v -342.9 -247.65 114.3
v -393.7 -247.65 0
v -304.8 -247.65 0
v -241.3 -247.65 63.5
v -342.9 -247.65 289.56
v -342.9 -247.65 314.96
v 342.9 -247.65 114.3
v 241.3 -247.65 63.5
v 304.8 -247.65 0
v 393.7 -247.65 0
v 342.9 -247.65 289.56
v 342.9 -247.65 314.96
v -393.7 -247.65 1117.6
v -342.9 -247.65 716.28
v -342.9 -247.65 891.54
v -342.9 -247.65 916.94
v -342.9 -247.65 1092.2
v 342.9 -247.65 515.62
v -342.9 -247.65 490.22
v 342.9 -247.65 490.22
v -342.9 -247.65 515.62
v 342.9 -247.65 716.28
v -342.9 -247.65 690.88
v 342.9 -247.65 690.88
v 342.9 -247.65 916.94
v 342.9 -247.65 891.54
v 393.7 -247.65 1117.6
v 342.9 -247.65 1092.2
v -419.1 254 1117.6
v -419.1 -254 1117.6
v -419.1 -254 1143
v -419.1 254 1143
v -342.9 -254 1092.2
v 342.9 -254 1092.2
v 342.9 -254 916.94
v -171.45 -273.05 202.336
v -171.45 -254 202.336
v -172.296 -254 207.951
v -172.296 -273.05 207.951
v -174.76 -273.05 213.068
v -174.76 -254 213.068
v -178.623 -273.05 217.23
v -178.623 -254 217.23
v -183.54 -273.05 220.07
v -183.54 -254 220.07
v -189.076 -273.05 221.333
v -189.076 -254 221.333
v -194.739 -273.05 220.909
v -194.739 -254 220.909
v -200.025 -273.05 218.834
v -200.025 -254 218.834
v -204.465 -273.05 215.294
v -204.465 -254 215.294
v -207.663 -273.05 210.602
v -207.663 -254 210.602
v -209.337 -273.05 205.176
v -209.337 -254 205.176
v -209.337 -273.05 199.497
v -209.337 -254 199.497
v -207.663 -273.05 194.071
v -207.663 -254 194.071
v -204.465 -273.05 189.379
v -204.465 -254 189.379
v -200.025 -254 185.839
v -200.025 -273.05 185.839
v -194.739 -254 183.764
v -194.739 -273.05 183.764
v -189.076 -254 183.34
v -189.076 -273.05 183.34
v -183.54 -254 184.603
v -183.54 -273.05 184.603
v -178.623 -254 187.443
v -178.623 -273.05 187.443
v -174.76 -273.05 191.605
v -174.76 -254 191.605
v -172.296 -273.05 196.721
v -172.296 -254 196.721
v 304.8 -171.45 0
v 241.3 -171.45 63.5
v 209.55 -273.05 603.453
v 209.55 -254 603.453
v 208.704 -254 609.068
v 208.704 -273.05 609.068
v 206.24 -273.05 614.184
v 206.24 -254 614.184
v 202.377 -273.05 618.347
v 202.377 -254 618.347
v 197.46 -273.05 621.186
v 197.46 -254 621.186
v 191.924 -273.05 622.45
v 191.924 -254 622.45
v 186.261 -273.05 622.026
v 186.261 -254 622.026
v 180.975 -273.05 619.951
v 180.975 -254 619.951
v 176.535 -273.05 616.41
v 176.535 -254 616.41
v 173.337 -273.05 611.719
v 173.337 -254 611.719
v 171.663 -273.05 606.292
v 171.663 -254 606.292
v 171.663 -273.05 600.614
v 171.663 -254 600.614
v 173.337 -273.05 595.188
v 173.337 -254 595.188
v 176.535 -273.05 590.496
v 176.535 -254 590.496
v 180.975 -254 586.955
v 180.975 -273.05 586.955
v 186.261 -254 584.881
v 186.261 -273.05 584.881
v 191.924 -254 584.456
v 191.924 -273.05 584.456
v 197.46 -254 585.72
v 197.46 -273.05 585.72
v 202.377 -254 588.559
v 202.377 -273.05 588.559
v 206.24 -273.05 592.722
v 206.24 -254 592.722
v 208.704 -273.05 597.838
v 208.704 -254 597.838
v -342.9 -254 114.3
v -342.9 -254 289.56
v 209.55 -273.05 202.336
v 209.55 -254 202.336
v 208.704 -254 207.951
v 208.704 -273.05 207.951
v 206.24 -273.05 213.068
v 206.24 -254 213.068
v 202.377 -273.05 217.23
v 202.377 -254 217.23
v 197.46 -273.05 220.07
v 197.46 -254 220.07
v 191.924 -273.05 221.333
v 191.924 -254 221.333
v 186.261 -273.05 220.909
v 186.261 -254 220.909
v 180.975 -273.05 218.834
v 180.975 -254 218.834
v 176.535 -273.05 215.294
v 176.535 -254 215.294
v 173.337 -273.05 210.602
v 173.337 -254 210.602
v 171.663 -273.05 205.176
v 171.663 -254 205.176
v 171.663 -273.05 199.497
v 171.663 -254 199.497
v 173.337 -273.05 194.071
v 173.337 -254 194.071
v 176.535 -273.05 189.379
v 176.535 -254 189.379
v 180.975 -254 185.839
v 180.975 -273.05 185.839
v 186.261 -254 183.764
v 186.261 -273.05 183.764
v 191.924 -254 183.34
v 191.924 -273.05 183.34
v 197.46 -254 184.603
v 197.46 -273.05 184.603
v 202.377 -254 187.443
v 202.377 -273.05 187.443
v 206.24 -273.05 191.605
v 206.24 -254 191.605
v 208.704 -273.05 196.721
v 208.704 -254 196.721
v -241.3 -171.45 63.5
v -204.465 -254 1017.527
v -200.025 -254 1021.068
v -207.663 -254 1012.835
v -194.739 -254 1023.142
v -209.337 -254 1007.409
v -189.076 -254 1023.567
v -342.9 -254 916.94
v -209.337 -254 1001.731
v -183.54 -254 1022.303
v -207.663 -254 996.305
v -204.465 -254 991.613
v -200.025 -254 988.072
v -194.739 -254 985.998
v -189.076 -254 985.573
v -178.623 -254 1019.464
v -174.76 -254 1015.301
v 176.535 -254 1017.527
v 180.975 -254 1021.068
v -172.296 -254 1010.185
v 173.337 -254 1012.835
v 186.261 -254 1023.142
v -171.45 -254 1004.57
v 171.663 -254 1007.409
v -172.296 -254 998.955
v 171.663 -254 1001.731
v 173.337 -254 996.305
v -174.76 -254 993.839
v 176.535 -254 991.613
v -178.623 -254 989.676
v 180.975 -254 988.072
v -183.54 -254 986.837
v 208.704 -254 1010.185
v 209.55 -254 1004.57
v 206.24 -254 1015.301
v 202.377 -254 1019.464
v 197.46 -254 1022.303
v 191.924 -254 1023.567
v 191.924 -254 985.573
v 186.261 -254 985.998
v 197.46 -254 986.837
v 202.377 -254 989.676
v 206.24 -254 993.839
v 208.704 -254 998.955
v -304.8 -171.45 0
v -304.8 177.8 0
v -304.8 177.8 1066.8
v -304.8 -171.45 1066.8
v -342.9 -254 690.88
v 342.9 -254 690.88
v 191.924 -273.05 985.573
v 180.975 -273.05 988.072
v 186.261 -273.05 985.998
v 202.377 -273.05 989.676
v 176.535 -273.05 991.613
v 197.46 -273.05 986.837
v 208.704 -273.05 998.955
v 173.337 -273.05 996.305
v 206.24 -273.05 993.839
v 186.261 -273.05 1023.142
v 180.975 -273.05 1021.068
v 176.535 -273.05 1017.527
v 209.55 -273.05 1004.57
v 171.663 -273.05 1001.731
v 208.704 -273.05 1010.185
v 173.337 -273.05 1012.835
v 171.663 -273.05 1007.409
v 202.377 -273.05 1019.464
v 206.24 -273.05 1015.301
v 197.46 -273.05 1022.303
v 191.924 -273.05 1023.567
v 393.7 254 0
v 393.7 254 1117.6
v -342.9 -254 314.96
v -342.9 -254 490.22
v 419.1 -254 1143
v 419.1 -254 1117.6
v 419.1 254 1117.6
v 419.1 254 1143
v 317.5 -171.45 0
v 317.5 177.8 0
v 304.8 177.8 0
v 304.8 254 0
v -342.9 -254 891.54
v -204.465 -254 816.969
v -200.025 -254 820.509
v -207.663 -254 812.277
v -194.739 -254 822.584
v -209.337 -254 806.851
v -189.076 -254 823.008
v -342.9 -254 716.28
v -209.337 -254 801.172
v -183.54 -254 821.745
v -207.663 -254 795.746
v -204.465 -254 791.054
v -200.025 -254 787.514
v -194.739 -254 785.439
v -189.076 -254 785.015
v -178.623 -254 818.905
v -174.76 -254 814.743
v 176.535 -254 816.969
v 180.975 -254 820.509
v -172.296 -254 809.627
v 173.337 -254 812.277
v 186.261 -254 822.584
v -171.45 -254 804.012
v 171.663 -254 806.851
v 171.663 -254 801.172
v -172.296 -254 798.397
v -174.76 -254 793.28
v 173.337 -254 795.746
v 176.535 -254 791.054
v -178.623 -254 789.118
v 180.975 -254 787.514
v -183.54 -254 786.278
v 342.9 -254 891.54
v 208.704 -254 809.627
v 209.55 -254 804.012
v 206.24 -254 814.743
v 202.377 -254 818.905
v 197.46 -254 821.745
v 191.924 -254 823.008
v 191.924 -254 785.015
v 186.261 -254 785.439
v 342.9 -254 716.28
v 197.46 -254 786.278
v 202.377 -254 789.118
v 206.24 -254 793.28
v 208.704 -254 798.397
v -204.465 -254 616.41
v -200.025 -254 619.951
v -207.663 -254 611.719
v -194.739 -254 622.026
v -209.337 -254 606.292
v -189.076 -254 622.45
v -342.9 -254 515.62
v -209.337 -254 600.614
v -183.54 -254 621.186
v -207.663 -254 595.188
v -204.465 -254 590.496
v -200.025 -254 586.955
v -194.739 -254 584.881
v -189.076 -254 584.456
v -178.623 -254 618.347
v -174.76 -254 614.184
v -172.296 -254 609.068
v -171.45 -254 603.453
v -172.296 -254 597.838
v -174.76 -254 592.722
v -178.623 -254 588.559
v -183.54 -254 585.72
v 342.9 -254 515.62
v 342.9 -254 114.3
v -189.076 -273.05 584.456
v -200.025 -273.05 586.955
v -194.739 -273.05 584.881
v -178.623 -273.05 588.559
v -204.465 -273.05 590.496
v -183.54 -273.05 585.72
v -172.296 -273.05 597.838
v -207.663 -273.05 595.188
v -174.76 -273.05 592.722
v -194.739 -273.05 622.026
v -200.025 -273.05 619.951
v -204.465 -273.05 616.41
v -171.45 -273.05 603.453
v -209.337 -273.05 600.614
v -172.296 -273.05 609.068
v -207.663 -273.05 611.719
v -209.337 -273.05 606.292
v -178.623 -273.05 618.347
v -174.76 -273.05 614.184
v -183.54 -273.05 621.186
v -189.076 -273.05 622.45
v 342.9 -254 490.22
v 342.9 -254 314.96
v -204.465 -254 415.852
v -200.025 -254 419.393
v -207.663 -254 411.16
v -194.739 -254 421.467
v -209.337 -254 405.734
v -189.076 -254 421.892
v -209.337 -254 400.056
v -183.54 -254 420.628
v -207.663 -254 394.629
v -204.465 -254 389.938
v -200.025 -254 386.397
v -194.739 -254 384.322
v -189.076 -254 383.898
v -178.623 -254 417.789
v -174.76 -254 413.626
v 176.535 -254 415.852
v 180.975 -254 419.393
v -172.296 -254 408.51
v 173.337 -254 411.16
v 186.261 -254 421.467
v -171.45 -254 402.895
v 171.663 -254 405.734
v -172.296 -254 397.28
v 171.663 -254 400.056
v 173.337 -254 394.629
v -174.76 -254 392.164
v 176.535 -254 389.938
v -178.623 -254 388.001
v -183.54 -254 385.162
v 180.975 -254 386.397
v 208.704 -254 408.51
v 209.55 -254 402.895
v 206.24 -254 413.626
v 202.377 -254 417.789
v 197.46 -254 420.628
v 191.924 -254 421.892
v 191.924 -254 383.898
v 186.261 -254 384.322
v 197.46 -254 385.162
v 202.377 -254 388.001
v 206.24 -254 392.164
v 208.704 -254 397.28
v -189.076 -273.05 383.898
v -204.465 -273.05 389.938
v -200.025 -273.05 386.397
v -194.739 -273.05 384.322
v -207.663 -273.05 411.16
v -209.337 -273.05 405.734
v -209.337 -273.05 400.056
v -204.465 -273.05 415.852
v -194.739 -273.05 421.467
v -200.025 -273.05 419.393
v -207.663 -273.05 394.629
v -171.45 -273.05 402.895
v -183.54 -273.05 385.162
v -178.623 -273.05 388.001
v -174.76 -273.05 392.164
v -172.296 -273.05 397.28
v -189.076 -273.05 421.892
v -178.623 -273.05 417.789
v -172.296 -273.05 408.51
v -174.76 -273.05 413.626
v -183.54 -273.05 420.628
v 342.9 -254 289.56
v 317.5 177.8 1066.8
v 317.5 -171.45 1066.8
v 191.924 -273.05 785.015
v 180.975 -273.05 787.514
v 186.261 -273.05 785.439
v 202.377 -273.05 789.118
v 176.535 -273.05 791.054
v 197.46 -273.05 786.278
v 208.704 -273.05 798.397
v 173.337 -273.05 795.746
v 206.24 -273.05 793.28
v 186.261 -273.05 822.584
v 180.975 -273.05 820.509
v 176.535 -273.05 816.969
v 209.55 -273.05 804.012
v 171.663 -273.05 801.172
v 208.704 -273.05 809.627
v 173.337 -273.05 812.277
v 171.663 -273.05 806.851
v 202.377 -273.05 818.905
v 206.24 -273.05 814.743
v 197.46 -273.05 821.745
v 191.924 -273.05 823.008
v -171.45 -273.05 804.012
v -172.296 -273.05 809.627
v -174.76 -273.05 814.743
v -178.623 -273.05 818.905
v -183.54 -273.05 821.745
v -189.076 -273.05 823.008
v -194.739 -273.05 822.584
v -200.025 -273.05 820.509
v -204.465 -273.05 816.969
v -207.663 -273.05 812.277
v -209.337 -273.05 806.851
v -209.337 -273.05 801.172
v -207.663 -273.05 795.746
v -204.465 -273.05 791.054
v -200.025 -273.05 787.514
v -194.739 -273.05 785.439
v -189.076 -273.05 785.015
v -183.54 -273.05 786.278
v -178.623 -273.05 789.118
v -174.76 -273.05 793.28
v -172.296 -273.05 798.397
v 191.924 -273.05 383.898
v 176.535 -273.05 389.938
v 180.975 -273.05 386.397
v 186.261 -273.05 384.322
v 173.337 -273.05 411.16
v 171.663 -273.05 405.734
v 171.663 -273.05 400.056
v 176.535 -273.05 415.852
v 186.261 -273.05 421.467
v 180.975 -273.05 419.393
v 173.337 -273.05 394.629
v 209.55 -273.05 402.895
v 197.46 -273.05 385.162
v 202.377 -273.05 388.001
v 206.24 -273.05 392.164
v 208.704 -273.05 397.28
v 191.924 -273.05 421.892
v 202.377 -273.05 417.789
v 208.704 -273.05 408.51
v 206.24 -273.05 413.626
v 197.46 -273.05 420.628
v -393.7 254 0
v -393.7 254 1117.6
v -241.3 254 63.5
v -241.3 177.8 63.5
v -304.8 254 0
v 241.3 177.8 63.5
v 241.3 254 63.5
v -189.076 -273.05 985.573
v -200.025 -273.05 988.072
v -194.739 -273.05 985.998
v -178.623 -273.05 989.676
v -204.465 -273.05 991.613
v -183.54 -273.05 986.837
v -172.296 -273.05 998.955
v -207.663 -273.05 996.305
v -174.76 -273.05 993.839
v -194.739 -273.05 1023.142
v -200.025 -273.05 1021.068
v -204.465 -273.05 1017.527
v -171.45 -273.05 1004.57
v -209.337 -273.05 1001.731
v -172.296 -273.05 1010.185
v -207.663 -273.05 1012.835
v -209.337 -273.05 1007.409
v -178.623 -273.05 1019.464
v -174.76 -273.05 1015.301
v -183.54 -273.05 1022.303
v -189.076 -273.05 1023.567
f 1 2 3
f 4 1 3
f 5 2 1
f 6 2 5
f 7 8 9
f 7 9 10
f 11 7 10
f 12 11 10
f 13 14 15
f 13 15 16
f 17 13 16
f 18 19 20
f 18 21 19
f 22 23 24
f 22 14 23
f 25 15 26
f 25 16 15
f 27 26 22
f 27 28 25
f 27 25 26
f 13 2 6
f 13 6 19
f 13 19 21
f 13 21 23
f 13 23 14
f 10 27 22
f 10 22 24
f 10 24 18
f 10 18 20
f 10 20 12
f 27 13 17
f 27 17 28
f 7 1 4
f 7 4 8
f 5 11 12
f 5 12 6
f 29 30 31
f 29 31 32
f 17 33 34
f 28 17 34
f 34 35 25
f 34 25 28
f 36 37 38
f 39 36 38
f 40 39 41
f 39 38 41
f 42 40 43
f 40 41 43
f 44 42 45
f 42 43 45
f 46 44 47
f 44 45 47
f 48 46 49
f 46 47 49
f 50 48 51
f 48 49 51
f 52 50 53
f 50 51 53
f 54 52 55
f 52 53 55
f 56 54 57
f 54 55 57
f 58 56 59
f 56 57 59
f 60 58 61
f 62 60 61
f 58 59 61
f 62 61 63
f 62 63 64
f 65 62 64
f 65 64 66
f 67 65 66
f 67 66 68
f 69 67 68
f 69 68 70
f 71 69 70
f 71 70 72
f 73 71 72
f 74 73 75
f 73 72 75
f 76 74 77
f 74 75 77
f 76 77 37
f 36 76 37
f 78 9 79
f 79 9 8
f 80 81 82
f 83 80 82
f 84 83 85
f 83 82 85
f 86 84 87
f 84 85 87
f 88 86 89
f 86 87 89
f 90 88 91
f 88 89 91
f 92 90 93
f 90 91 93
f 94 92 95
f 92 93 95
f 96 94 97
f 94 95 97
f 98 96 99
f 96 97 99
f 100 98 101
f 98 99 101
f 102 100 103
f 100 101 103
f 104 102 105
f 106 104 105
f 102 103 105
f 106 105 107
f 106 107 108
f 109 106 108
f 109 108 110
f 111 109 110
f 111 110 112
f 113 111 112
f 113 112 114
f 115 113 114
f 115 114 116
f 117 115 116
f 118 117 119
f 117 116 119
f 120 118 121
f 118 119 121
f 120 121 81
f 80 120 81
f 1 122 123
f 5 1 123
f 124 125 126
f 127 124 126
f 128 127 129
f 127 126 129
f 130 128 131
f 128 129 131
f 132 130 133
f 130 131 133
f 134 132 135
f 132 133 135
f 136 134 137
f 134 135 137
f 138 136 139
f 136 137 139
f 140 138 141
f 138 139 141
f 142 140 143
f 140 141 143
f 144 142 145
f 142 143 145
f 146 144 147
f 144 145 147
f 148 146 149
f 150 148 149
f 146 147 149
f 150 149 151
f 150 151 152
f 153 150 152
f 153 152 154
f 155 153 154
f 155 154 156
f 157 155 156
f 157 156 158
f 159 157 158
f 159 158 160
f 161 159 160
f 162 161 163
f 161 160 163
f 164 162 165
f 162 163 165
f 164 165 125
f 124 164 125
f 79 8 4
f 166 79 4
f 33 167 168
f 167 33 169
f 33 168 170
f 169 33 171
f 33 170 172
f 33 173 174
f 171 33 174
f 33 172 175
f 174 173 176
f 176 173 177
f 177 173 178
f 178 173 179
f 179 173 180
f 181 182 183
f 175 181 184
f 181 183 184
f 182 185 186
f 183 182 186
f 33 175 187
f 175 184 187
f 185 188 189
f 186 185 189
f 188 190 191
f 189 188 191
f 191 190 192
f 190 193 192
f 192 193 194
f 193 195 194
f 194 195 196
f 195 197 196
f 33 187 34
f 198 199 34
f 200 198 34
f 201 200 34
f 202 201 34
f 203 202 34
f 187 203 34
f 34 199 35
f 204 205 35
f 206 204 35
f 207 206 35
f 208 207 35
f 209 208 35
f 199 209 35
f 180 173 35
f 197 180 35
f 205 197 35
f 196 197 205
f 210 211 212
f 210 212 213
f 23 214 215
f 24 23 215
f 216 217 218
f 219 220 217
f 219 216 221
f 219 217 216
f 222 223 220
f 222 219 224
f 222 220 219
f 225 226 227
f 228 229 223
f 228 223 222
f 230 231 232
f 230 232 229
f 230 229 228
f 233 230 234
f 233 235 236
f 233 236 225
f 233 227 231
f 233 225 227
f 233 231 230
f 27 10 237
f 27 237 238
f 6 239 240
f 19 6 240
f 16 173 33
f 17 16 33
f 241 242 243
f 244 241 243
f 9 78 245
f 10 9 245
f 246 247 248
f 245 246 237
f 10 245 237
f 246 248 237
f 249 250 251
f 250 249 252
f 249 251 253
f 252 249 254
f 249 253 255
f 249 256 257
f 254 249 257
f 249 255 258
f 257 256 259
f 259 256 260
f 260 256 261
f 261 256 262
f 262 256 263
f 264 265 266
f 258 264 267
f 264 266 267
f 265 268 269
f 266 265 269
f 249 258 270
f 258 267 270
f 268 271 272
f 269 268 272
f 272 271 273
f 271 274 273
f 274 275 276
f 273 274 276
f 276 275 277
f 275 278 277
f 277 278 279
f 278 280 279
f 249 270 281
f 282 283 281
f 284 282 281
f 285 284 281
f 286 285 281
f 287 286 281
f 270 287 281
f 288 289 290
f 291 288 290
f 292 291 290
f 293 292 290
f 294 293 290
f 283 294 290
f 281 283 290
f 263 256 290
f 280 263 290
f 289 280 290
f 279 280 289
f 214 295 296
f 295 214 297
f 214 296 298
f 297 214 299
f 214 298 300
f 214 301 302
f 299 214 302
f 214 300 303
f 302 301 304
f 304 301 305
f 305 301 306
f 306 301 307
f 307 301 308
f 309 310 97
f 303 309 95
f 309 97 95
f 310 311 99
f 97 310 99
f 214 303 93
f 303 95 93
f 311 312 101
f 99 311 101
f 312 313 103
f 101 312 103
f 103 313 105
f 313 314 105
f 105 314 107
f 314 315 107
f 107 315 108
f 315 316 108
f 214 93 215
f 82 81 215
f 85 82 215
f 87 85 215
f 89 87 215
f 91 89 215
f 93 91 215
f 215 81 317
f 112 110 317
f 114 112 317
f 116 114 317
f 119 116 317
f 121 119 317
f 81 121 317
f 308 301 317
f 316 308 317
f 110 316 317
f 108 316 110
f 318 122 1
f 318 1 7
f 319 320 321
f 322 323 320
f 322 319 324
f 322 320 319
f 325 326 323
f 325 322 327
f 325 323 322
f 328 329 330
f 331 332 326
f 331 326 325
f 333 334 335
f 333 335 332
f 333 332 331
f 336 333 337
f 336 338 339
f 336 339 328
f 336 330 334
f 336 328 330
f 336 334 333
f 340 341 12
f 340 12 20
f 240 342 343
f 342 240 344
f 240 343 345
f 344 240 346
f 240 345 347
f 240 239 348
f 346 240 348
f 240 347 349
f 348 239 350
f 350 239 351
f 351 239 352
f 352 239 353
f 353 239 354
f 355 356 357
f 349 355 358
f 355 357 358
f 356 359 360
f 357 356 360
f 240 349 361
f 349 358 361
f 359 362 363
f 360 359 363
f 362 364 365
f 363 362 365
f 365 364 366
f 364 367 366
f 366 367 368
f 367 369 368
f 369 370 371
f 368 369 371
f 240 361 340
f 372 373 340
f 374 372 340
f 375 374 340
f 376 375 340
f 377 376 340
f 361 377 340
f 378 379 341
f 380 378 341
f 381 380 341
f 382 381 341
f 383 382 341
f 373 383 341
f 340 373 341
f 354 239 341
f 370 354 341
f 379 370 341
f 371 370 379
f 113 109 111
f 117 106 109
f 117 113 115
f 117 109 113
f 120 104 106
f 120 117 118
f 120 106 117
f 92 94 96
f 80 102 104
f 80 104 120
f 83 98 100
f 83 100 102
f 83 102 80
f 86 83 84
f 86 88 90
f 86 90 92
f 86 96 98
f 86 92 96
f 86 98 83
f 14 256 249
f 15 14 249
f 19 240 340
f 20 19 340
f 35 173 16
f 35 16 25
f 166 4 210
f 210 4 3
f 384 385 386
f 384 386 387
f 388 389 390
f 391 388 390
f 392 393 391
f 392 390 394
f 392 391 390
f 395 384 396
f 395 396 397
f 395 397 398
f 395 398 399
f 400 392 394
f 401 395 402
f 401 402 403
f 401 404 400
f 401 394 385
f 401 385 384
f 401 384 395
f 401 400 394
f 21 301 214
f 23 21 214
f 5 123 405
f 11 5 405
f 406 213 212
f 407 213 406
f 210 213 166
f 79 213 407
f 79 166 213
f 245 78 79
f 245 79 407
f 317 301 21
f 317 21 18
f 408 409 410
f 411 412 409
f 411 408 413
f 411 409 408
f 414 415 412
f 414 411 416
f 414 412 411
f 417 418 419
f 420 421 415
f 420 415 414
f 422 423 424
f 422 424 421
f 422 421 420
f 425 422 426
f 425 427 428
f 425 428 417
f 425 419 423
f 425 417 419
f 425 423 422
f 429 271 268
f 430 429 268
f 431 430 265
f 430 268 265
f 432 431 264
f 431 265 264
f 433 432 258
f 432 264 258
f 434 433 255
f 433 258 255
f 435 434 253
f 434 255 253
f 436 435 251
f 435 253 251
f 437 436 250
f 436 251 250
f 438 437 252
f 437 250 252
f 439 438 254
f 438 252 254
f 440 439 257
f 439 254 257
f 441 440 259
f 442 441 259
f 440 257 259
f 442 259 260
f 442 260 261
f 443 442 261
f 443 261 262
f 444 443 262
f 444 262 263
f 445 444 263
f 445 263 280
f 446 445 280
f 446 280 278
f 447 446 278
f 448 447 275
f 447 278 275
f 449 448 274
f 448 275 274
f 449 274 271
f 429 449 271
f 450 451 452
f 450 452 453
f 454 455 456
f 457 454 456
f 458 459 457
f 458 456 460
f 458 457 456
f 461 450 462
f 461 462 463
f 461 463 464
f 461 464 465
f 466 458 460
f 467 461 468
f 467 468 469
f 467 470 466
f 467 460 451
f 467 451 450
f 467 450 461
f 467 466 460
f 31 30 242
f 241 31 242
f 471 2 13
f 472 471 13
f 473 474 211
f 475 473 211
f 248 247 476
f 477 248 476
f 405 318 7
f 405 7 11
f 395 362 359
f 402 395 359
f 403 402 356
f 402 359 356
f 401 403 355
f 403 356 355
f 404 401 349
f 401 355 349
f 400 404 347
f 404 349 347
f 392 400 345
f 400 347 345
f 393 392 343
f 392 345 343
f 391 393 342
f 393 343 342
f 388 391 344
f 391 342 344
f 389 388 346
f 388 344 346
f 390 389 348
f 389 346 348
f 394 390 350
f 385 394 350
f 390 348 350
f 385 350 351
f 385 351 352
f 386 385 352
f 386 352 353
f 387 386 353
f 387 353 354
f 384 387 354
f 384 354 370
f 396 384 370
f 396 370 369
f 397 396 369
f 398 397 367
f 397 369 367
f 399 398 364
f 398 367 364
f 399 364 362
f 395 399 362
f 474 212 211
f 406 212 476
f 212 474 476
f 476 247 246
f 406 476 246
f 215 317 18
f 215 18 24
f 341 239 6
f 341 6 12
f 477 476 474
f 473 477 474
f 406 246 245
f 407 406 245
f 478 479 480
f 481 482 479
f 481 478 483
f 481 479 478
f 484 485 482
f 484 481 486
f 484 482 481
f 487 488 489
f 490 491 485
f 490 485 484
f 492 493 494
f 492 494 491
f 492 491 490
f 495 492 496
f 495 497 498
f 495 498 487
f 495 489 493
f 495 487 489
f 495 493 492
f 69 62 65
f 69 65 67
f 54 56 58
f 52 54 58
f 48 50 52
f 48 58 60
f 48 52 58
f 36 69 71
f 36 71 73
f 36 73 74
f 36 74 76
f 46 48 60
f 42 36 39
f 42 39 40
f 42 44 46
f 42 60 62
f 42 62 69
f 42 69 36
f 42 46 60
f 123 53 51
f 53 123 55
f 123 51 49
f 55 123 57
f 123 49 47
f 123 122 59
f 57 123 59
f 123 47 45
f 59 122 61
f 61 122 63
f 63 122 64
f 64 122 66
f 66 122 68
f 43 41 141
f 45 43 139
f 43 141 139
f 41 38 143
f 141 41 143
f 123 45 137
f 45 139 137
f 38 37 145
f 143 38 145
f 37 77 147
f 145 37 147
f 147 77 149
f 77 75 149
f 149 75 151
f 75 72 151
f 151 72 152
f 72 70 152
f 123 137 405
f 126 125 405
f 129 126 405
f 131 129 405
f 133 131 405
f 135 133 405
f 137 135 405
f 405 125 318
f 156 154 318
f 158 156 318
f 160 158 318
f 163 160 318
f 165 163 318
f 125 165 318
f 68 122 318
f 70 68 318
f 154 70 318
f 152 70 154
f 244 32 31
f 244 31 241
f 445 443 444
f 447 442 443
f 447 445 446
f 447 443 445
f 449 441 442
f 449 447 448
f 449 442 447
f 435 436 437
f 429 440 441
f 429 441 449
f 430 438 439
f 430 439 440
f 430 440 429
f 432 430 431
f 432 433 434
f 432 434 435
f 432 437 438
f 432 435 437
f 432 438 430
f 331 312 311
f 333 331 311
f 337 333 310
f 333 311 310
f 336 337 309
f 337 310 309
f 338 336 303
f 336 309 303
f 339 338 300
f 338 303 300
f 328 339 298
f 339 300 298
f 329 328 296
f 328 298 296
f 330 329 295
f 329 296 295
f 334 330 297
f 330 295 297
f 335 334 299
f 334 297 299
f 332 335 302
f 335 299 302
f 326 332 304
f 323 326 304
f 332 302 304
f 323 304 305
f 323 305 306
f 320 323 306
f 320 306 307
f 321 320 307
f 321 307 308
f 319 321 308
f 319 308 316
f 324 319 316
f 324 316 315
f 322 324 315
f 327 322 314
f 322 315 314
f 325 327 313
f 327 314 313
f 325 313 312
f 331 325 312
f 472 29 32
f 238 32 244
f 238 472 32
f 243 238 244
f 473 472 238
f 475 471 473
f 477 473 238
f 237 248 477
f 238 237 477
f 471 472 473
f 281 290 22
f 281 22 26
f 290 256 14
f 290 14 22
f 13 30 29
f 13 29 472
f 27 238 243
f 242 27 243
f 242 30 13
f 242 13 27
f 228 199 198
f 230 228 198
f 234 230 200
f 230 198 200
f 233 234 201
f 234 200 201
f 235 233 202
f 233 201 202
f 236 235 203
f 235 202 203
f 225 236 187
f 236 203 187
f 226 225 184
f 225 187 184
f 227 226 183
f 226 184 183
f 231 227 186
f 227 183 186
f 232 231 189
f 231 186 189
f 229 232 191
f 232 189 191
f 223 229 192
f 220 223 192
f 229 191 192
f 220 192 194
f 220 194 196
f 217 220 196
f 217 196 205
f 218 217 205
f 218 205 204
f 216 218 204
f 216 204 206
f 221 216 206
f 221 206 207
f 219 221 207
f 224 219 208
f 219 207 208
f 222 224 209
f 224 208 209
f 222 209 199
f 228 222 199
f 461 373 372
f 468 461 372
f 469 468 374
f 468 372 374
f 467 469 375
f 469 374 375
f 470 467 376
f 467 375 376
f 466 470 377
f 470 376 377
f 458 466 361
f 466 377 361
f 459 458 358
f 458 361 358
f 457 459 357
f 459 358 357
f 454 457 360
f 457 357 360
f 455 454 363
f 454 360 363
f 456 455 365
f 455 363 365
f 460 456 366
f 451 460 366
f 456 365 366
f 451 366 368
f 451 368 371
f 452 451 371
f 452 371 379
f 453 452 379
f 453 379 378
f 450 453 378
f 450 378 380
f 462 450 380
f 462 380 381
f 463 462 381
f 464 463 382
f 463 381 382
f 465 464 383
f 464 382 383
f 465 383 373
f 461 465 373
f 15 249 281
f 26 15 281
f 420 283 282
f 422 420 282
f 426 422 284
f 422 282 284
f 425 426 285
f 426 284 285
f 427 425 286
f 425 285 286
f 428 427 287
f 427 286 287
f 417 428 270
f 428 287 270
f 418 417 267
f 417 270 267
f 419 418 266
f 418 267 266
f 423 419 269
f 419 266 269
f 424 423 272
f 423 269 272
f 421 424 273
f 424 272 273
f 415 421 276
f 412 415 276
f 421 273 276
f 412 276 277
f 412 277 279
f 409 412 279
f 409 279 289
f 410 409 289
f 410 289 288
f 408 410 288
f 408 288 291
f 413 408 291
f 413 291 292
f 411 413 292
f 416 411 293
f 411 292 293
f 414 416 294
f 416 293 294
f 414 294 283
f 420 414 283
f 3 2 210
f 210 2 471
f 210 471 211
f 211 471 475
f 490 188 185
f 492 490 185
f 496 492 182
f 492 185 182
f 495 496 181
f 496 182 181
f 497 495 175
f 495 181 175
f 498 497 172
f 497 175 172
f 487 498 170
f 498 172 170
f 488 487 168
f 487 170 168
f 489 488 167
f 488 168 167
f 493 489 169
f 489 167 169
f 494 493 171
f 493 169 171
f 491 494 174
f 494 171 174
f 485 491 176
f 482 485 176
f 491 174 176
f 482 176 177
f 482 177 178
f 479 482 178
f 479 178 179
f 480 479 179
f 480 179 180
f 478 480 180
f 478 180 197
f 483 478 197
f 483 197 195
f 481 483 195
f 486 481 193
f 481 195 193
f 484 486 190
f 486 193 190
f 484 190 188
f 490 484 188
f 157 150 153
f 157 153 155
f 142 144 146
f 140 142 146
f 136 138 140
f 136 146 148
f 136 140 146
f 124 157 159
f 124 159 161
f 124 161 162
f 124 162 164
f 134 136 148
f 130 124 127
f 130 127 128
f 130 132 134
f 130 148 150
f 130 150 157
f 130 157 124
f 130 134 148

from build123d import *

# Parameters (mm, degrees)
F0_W     = 838.2
F0_H     = 508
F1_DEPTH = 1143
F2_W     = 25.4
F2_H     = 1117.6
F3_DEPTH = 508.001
F2_W_2   = 685.8
F2_H_2   = 175.26
F4_DEPTH = 6.35
F2_R     = 19.05
F5_DEPTH = 19.05
F6_W     = 622.3
F6_H     = 349.25
F7_DEPTH = 1066.8


with BuildPart() as f1:
    # F0 (on Top) → F1 (new body)
    with BuildSketch(Plane.XY):
        Rectangle(F0_W, F0_H)
    extrude(amount=F1_DEPTH)

    # F2 (on face) → F3 (cut, through all)
    with BuildSketch(Plane.XZ.offset(254)):
        with Locations((-406.4, 558.8)):
            Rectangle(F2_W, F2_H)
        with Locations((406.4, 558.8)):
            Rectangle(F2_W, F2_H)
        Polygon((-241.3, 63.5), (-304.8, 0), (304.8, 0), (241.3, 63.5), align=None)
    extrude(amount=-F3_DEPTH, mode=Mode.SUBTRACT)

    # F2 (on face) → F4 (cut)
    with BuildSketch(Plane.XZ.offset(254)):
        Polygon((-393.7, 1117.6), (-393.7, 0), (-304.8, 0), (-241.3, 63.5), (241.3, 63.5), (304.8, 0), (393.7, 0), (393.7, 1117.6), align=None)
        with Locations((0, 201.93)):
            Rectangle(F2_W_2, F2_H_2, mode=Mode.SUBTRACT)
        with Locations((0, 402.59)):
            Rectangle(F2_W_2, F2_H_2, mode=Mode.SUBTRACT)
        with Locations((0, 603.25)):
            Rectangle(F2_W_2, F2_H_2, mode=Mode.SUBTRACT)
        with Locations((0, 803.91)):
            Rectangle(F2_W_2, F2_H_2, mode=Mode.SUBTRACT)
        with Locations((0, 1004.57)):
            Rectangle(F2_W_2, F2_H_2, mode=Mode.SUBTRACT)
    extrude(amount=-F4_DEPTH, mode=Mode.SUBTRACT)

    # F2 (on face) → F5 (join)
    with BuildSketch(Plane.XZ.offset(254)):
        with Locations((-190.5, 1004.57)):
            Circle(F2_R)
        with Locations((190.5, 1004.57)):
            Circle(F2_R)
        with Locations((190.5, 804.0116)):
            Circle(F2_R)
        with Locations((-190.5, 804.0116)):
            Circle(F2_R)
        with Locations((-190.5, 603.4532)):
            Circle(F2_R)
        with Locations((190.5, 603.4532)):
            Circle(F2_R)
        with Locations((190.5, 402.8948)):
            Circle(F2_R)
        with Locations((-190.5, 402.8948)):
            Circle(F2_R)
        with Locations((-190.5, 202.3364)):
            Circle(F2_R)
        with Locations((190.5, 202.3364)):
            Circle(F2_R)
    extrude(amount=F5_DEPTH)

    # F6 (on face) → F7 (cut)
    with BuildSketch(Plane(origin=(0, 0, 0), x_dir=(1, 0, 0), z_dir=(0, 0, -1))):
        with Locations((6.35, -3.175)):
            Rectangle(F6_W, F6_H)
    extrude(amount=-F7_DEPTH, mode=Mode.SUBTRACT)


solid = f1.part
